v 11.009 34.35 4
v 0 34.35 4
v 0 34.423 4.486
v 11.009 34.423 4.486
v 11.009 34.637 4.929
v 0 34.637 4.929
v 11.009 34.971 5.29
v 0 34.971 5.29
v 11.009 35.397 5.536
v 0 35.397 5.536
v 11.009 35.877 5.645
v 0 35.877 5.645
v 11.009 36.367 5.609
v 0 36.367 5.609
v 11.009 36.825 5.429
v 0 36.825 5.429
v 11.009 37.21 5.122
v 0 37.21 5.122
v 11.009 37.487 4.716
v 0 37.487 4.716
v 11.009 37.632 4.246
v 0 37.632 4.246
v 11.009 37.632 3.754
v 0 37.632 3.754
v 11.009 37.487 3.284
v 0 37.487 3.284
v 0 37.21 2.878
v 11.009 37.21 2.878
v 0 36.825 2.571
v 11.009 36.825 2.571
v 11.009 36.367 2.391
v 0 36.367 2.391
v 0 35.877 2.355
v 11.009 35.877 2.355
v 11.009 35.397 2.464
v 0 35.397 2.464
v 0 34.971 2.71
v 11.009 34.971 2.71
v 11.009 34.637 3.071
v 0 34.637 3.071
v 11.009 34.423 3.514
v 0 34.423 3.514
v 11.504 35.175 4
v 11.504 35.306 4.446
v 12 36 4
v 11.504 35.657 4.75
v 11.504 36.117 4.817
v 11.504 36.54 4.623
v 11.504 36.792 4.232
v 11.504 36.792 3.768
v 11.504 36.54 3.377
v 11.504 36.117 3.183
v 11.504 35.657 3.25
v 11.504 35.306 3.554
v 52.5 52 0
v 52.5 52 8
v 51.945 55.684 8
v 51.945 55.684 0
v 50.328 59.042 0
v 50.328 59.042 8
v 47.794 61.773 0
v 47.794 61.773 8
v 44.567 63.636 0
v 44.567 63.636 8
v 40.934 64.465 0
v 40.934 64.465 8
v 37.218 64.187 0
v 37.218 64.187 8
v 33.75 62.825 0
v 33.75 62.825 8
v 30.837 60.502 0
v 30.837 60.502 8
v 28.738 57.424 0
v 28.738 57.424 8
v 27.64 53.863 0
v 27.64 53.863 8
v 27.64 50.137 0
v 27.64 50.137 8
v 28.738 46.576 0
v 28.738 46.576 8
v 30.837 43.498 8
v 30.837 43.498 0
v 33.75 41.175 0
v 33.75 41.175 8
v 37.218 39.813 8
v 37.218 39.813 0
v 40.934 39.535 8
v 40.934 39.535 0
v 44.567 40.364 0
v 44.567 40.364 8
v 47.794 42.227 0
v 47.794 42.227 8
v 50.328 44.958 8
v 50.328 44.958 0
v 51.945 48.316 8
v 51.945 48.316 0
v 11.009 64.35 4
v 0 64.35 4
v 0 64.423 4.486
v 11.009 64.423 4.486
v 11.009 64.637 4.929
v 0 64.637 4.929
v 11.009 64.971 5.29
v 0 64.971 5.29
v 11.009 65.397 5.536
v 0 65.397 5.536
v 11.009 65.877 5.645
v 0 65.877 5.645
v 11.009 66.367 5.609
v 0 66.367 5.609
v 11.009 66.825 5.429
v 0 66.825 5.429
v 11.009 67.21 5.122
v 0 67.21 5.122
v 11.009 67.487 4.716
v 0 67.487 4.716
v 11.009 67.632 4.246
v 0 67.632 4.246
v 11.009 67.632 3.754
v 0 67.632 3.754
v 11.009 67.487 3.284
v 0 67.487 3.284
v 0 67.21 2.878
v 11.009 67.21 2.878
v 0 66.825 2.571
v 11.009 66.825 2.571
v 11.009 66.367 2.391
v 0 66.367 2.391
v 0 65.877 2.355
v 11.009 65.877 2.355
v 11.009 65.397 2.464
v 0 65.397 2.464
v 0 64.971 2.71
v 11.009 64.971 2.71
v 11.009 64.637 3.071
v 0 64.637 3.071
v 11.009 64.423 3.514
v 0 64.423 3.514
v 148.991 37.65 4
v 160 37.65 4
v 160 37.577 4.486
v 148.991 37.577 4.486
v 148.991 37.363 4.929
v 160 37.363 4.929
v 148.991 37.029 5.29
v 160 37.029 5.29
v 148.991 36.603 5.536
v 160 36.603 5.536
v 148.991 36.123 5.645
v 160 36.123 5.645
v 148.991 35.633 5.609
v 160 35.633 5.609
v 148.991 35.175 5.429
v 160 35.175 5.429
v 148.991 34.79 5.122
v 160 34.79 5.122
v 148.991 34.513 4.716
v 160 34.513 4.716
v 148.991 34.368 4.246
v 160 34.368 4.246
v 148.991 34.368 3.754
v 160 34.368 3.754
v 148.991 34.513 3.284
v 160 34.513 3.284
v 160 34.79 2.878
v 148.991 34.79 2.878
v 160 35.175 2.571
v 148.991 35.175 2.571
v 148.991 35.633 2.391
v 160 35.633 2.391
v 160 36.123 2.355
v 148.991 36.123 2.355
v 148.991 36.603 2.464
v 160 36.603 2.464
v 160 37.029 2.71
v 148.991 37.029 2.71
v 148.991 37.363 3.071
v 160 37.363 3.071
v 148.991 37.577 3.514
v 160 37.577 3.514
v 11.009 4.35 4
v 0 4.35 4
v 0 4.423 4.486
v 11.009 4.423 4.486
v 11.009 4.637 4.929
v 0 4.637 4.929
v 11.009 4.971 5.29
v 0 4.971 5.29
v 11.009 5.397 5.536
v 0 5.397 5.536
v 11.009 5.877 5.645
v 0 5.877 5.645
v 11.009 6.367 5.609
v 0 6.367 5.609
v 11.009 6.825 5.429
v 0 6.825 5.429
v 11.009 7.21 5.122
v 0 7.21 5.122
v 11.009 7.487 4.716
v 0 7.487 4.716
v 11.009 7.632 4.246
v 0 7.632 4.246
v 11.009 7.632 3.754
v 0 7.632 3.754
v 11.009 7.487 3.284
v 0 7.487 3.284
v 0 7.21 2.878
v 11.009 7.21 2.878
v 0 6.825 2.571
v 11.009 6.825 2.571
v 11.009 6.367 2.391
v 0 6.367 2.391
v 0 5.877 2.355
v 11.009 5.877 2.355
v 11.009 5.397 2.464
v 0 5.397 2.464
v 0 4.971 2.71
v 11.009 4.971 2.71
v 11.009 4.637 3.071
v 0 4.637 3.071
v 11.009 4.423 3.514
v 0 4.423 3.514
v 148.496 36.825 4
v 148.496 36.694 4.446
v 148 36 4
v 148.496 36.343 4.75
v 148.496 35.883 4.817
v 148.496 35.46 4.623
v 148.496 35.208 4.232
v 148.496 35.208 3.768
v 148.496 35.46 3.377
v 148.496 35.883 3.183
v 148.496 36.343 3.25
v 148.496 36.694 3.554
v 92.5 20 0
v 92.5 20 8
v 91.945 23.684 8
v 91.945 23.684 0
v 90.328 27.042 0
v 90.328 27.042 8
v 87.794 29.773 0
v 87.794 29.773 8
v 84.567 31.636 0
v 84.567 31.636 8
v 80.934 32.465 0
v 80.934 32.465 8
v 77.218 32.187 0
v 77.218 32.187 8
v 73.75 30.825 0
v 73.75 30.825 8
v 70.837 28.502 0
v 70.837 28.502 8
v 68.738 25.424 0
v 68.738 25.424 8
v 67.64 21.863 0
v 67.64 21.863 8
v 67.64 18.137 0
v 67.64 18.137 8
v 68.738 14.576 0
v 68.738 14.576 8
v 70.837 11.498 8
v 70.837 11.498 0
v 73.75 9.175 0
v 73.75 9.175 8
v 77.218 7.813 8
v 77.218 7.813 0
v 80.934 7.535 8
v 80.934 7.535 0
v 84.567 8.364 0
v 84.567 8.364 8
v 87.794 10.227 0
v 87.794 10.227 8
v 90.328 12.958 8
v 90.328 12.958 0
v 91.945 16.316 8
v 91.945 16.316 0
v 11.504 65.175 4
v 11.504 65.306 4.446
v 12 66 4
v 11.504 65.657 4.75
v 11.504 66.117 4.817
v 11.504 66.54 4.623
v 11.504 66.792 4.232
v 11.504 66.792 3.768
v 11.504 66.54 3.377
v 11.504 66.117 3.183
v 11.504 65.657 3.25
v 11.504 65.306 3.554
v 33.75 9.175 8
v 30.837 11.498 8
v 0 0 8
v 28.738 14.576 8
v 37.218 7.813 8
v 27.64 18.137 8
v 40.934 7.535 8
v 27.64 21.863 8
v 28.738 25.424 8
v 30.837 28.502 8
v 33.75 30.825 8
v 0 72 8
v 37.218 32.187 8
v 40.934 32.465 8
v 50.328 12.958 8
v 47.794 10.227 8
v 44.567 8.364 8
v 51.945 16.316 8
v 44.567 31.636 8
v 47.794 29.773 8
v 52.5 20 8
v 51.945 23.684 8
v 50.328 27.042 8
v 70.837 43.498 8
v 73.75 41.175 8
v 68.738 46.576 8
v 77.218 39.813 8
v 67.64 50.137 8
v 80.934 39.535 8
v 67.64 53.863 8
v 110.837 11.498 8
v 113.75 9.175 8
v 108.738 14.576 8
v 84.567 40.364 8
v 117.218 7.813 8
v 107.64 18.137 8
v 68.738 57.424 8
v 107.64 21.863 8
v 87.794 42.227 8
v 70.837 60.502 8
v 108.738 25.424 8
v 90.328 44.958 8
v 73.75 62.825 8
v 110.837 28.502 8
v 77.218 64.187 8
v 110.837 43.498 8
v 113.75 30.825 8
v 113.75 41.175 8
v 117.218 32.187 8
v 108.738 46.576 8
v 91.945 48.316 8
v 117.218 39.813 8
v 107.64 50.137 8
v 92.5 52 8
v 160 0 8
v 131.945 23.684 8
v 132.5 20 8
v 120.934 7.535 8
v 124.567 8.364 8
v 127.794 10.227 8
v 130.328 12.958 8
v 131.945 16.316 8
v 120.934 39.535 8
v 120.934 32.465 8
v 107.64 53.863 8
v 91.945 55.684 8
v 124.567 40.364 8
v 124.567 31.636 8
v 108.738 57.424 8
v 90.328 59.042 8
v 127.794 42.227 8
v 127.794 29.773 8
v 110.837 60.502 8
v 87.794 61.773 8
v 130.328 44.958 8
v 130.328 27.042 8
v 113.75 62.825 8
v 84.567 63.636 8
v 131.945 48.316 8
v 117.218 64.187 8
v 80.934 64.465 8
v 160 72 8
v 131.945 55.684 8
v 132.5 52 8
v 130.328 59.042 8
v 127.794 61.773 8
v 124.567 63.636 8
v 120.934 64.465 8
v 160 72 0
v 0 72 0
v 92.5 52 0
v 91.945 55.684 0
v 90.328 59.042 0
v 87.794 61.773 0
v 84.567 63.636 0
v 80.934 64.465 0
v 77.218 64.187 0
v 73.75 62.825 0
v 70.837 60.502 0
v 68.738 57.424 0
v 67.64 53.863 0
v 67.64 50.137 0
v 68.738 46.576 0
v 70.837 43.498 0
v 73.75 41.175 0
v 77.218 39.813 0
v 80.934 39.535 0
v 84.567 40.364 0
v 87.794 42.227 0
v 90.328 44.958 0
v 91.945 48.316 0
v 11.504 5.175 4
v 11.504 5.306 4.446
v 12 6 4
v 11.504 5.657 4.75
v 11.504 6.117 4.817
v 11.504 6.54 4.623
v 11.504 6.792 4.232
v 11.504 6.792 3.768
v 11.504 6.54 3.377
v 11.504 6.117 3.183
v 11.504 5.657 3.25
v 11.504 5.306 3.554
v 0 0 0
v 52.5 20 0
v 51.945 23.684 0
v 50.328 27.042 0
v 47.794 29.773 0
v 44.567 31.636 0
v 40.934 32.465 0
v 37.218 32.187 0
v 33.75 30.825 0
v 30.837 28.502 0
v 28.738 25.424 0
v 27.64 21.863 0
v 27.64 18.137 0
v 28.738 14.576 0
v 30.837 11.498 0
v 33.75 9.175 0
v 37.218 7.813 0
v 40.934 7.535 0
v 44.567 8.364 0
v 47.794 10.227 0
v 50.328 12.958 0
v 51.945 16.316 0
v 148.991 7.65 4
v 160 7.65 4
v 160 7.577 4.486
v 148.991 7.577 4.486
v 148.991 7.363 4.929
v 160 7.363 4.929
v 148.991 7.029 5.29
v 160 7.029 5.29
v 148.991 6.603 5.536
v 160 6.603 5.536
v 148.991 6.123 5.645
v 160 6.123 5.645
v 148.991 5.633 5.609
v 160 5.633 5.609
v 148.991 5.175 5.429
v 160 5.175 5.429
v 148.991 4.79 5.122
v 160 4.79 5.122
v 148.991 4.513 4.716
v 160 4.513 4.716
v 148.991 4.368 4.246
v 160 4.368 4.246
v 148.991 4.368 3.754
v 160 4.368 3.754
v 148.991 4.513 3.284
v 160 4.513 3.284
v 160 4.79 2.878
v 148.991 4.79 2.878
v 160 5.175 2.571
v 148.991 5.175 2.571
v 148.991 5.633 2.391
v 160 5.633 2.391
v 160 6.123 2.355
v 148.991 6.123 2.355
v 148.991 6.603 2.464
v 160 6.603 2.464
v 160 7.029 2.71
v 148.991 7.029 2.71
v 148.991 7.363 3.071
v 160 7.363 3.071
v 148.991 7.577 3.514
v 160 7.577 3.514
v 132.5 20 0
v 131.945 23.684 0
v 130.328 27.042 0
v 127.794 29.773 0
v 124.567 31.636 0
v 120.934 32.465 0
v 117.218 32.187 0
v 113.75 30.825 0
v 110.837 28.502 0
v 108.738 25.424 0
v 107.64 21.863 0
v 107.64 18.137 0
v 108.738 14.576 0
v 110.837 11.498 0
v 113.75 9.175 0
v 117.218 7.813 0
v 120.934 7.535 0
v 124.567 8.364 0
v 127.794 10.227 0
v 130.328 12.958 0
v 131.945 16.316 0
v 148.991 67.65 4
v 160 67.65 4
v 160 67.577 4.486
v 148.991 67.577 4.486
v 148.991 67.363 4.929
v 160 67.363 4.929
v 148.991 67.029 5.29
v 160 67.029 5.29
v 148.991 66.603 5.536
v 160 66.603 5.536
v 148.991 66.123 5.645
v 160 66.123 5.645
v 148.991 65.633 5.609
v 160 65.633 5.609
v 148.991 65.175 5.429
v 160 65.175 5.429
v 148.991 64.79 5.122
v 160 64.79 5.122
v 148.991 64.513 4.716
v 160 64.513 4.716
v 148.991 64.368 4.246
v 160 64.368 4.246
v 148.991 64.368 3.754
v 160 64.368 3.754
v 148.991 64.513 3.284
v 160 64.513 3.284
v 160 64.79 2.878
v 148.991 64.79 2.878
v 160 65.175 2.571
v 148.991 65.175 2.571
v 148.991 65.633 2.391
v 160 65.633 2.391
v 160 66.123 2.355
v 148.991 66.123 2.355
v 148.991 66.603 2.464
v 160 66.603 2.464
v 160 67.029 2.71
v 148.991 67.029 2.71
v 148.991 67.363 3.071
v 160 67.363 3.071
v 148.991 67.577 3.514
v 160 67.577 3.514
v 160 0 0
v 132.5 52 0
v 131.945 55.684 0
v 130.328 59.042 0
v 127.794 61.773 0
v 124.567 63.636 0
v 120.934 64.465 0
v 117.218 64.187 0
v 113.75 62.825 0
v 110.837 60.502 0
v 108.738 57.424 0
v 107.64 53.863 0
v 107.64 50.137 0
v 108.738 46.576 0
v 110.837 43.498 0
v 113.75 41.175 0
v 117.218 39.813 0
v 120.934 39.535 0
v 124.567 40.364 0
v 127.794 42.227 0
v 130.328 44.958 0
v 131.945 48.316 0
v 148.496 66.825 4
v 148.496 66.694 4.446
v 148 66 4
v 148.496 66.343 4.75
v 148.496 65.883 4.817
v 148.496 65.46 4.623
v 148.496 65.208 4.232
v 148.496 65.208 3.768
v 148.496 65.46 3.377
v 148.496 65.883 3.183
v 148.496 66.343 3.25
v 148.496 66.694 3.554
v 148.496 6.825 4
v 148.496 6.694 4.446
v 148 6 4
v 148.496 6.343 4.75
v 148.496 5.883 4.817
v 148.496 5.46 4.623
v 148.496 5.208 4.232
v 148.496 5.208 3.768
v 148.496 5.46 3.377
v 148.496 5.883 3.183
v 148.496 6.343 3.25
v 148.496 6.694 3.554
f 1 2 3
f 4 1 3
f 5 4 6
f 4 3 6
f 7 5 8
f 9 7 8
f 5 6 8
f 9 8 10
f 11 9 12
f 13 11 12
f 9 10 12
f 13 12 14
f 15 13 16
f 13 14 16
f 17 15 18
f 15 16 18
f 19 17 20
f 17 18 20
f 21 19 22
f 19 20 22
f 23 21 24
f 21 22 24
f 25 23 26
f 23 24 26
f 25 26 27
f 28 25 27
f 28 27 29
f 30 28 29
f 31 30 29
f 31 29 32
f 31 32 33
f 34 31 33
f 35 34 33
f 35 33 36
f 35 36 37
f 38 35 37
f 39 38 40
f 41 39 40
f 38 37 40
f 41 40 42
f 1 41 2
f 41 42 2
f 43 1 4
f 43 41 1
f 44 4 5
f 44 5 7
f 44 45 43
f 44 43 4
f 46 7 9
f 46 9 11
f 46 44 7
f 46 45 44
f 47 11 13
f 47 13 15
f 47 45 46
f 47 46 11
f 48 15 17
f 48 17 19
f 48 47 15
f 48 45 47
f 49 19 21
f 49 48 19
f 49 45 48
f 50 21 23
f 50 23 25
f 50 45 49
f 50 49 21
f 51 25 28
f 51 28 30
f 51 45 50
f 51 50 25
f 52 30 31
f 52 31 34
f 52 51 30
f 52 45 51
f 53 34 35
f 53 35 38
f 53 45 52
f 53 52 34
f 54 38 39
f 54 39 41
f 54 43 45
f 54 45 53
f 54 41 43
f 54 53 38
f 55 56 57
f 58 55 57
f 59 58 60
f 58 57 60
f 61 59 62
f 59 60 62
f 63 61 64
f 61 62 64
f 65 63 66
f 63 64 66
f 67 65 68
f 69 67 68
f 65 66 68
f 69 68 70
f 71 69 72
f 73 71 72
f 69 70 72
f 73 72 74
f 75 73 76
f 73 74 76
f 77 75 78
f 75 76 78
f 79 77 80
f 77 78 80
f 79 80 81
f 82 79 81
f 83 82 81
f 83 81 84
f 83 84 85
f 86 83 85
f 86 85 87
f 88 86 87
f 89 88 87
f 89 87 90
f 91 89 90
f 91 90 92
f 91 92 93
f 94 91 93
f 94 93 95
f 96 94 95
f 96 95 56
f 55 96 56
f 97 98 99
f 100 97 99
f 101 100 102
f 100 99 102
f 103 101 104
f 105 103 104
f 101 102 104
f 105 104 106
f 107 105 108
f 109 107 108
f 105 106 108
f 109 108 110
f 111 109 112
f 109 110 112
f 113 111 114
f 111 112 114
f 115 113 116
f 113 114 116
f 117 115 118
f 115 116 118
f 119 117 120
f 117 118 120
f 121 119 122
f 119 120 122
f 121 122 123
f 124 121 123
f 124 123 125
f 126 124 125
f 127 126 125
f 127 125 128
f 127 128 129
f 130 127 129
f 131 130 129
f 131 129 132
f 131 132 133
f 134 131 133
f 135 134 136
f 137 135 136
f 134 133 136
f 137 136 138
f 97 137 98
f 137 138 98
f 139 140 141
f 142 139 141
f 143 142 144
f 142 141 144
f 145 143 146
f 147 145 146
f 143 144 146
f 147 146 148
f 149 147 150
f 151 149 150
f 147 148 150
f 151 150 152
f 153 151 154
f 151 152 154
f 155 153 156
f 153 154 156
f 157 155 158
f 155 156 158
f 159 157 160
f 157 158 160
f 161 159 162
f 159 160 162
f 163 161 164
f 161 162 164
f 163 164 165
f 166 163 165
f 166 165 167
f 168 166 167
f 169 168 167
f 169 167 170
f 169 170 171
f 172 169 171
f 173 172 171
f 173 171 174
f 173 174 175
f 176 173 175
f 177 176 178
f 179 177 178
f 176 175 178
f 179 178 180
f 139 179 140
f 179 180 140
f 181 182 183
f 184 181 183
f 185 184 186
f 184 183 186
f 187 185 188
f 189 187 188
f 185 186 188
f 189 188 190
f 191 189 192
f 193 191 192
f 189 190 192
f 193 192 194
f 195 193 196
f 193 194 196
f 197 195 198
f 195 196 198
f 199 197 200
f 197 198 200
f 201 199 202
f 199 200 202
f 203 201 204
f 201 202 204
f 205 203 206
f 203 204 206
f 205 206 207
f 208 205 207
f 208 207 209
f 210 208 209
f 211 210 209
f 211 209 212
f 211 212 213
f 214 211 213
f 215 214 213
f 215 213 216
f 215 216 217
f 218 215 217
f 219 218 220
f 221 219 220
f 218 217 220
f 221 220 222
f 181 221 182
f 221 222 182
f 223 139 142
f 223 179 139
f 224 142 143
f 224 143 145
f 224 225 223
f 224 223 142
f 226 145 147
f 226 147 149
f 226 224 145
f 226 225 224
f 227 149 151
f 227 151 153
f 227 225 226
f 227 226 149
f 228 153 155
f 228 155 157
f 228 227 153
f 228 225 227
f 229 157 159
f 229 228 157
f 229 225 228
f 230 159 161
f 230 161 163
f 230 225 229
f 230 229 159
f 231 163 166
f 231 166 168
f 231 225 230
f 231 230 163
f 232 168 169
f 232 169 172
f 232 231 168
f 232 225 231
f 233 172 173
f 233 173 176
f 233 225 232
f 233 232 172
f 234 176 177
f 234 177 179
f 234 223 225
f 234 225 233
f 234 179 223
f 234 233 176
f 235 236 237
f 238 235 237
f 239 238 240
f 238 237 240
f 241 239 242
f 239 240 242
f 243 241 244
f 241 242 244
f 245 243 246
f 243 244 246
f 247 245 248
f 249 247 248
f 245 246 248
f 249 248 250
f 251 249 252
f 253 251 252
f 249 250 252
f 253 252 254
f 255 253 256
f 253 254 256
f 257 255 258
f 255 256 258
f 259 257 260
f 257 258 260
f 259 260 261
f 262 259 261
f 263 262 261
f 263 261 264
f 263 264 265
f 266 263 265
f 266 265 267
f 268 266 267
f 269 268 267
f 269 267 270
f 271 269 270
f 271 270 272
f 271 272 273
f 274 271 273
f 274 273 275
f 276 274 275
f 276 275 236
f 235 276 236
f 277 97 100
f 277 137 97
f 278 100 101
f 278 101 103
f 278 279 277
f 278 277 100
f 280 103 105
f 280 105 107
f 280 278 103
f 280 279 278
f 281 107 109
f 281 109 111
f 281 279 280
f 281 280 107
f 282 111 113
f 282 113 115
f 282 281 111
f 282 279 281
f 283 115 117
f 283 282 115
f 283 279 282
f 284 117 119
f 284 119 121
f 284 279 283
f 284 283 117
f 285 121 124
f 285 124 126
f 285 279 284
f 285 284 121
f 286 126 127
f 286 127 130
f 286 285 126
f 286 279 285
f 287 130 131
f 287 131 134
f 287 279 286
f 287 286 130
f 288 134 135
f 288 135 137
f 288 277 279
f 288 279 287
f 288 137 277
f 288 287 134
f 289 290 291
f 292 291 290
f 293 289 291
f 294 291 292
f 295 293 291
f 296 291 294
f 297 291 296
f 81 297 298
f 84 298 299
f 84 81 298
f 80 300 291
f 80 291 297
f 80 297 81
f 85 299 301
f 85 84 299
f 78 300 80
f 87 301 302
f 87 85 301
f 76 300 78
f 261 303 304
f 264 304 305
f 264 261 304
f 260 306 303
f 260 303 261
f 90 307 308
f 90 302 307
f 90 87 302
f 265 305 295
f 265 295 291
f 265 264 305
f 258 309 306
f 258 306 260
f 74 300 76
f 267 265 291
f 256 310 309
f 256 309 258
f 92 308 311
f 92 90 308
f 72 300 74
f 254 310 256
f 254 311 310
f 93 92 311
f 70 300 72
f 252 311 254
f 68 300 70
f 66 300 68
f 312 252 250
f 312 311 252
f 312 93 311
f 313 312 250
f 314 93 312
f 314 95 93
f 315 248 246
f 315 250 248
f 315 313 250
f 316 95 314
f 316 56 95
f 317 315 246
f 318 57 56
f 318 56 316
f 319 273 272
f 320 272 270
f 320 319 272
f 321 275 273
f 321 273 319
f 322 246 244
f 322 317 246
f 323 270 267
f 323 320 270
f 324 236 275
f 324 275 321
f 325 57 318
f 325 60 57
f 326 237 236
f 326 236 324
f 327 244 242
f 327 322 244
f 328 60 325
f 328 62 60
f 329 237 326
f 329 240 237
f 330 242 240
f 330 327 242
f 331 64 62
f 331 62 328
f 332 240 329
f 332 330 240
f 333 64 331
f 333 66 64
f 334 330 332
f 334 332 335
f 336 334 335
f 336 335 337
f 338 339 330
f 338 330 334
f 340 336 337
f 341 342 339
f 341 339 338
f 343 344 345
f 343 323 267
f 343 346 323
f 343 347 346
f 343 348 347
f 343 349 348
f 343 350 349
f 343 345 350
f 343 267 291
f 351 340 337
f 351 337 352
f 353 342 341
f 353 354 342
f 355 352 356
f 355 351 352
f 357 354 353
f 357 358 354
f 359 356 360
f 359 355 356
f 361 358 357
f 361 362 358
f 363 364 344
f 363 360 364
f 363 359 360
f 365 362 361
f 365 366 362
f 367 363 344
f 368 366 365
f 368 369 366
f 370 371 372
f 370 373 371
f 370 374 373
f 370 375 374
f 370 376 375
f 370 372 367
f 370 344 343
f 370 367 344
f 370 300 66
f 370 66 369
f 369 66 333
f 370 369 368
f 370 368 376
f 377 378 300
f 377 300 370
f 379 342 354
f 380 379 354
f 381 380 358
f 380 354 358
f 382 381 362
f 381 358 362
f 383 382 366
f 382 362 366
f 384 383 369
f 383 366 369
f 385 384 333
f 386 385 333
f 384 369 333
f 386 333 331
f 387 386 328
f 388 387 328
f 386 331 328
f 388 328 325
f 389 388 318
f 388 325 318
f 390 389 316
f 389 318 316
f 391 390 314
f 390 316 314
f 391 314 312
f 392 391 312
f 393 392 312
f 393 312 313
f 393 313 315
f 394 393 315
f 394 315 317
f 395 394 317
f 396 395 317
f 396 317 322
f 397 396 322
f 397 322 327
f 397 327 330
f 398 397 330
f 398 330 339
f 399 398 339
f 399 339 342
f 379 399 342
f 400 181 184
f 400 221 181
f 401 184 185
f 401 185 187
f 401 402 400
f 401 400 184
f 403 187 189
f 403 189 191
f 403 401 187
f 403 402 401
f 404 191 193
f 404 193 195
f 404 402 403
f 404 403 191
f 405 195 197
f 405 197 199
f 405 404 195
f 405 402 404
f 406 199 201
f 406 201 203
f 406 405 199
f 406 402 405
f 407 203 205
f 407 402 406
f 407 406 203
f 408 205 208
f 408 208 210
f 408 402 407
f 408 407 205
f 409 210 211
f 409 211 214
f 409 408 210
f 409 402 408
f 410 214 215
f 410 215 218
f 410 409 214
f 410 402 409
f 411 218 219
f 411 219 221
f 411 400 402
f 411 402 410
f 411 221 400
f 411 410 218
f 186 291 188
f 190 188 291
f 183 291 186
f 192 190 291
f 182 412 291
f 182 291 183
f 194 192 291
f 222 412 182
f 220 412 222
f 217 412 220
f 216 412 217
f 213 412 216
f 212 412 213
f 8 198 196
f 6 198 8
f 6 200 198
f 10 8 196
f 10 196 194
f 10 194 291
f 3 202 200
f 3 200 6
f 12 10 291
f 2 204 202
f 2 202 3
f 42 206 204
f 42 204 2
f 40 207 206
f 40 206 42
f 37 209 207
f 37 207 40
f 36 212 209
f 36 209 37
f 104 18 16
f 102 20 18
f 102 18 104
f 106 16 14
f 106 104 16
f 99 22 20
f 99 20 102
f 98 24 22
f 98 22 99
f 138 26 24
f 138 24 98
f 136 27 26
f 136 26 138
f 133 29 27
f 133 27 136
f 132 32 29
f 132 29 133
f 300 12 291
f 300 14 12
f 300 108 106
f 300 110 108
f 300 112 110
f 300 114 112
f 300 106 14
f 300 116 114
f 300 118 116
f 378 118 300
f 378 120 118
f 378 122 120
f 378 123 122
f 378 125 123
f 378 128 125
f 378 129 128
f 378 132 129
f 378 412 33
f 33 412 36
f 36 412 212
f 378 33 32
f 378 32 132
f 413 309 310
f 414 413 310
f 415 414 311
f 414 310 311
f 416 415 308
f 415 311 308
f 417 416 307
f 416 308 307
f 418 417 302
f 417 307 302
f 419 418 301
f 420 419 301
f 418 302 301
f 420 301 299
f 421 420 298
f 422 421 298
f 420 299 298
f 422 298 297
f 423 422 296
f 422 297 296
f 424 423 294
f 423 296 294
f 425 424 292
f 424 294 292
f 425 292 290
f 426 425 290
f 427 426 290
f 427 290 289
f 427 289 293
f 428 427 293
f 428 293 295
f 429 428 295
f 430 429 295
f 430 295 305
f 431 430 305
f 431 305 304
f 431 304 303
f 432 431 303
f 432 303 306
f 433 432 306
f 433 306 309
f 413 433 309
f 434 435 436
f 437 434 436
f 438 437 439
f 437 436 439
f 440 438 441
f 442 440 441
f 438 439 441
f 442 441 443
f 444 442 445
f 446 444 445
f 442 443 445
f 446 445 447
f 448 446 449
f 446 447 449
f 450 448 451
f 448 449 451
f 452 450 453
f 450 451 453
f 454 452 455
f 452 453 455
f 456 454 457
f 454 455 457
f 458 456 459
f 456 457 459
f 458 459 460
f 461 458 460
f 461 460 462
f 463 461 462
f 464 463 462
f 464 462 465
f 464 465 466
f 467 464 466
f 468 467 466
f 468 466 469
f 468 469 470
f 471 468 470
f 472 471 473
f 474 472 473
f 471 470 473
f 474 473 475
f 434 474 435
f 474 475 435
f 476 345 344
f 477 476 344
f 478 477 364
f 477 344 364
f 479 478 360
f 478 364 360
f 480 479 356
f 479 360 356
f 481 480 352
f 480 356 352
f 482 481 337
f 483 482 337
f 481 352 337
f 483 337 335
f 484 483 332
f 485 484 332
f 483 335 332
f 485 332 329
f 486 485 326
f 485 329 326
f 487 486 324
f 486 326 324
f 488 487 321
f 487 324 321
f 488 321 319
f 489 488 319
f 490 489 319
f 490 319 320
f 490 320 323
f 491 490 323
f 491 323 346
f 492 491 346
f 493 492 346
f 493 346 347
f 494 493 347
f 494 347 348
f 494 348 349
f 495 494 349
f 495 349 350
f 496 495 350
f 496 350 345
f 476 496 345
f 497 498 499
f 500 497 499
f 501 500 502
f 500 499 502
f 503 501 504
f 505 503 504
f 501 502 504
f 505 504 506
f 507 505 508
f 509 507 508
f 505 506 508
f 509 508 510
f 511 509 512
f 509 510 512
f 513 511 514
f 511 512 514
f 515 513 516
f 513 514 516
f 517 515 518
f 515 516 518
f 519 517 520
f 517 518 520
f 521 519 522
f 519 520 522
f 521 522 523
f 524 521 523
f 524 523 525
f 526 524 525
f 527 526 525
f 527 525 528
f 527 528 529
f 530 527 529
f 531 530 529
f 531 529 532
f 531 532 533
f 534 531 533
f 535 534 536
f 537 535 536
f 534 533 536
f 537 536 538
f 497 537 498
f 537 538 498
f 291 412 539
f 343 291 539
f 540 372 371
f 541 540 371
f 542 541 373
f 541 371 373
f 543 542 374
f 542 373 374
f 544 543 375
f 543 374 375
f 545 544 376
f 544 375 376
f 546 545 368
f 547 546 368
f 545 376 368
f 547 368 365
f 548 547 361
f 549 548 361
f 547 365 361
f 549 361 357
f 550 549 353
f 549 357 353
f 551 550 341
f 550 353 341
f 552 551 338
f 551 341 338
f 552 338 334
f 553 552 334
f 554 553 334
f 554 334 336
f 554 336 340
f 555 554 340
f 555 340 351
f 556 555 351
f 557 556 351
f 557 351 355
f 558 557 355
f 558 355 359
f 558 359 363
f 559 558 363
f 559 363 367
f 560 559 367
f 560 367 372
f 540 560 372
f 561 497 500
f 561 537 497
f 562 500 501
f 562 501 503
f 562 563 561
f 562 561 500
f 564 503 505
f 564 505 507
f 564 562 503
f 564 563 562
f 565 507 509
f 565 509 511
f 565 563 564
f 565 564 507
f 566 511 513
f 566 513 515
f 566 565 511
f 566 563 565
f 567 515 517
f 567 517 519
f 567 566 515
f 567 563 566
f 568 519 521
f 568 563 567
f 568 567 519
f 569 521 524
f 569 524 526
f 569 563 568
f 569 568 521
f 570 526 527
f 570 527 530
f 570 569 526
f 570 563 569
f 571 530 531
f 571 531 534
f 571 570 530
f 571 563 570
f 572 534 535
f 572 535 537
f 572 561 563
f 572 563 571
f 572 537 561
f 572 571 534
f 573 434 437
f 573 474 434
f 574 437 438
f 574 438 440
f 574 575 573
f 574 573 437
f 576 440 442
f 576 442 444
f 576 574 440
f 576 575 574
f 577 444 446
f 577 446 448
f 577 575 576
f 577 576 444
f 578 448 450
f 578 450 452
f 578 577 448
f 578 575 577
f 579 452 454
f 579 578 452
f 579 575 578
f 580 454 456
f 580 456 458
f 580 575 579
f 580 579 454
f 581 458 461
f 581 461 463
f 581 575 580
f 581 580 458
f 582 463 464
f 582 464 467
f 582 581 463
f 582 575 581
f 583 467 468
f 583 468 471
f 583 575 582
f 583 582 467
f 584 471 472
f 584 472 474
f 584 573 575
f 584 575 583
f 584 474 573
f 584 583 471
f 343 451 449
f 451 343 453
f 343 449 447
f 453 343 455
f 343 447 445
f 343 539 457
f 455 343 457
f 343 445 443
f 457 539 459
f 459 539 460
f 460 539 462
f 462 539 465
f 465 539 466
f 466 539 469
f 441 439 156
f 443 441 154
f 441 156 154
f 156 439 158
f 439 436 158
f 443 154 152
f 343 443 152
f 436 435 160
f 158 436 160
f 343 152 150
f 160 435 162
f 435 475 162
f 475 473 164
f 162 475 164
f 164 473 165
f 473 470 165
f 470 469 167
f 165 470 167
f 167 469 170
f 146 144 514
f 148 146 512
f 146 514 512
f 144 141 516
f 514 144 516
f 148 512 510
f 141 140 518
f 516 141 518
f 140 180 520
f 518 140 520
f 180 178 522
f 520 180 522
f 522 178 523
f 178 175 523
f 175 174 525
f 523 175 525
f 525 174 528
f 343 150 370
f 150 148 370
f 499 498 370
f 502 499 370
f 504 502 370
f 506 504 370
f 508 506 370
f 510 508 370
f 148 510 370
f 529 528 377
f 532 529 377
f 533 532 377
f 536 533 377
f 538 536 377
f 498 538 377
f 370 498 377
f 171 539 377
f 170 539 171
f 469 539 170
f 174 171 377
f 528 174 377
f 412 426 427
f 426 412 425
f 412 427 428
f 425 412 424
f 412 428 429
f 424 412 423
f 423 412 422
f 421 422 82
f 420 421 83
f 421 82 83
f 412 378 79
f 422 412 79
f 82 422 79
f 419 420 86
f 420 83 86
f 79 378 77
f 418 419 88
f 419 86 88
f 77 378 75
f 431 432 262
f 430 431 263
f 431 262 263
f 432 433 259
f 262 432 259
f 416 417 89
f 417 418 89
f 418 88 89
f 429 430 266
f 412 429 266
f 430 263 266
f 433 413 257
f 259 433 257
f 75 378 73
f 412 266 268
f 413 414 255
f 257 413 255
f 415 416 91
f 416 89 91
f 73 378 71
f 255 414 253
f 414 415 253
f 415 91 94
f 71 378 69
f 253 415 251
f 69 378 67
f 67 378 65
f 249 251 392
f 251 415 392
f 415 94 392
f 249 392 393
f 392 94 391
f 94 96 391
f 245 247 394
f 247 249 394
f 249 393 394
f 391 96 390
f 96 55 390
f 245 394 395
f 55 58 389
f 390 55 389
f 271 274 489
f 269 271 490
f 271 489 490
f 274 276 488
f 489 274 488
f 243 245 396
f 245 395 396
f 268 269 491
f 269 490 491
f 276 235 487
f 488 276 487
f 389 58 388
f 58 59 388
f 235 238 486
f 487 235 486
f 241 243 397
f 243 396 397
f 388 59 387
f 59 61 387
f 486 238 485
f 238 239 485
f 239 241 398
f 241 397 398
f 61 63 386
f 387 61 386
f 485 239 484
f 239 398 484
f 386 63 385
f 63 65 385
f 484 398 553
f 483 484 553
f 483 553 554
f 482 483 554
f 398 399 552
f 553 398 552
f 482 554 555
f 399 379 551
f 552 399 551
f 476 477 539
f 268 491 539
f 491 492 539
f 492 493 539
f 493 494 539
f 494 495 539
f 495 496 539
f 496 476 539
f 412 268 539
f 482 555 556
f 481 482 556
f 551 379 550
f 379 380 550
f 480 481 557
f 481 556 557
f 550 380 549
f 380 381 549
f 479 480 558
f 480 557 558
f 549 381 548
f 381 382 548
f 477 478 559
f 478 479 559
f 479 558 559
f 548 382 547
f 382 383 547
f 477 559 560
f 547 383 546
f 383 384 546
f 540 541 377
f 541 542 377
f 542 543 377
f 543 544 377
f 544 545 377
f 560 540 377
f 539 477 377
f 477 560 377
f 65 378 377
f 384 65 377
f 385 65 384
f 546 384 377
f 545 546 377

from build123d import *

# Parameters (mm, degrees)
BOX_W          = 160
BOX_H          = 72
BOX_DEPTH      = 8
SKETCH_R       = 1.65
HOLE_DEPTH     = 11.00858
HOLE_TIPS_R    = 1.65
SKETCH001_R    = 1.65
HOLE001_DEPTH  = 11.00858
HOLE001_TIPS_R = 1.65
SKETCH002_R    = 12.5
HOLE002_DEPTH  = 8.001


with BuildPart() as part:
    # Box → Box (new body)
    with BuildSketch(Plane.XY):
        with Locations((80, 36)):
            Rectangle(BOX_W, BOX_H)
    extrude(amount=BOX_DEPTH)

    # Sketch (on Face1 of BaseFeature) → Hole (cut)
    with BuildSketch(Plane(origin=(0, 0, 0), x_dir=(0, -1, 0), z_dir=(-1, 0, 0))):
        with Locations((-66, 4)):
            Circle(SKETCH_R)
        with Locations((-36, 4)):
            Circle(SKETCH_R)
        with Locations((-6, 4)):
            Circle(SKETCH_R)
    extrude(amount=-HOLE_DEPTH, mode=Mode.SUBTRACT)

    # Hole tips → Hole tip 1 section 0
    with BuildSketch(Plane(origin=(11.00858, 0, 0), x_dir=(0, -1, 0), z_dir=(-1, 0, 0)), mode=Mode.PRIVATE) as hole_tip_1_s0:
        with Locations((-66, 4)):
            Circle(HOLE_TIPS_R)
    loft([hole_tip_1_s0.sketch, Vertex(12, 66, 4)], mode=Mode.SUBTRACT)

    # Hole tips → Hole tip 2 section 0
    with BuildSketch(Plane(origin=(11.00858, 0, 0), x_dir=(0, -1, 0), z_dir=(-1, 0, 0)), mode=Mode.PRIVATE) as hole_tip_2_s0:
        with Locations((-36, 4)):
            Circle(HOLE_TIPS_R)
    loft([hole_tip_2_s0.sketch, Vertex(12, 36, 4)], mode=Mode.SUBTRACT)

    # Hole tips → Hole tip 3 section 0
    with BuildSketch(Plane(origin=(11.00858, 0, 0), x_dir=(0, -1, 0), z_dir=(-1, 0, 0)), mode=Mode.PRIVATE) as hole_tip_3_s0:
        with Locations((-6, 4)):
            Circle(HOLE_TIPS_R)
    loft([hole_tip_3_s0.sketch, Vertex(12, 6, 4)], mode=Mode.SUBTRACT)

    # Sketch001 (on Face9 of Hole) → Hole001 (cut)
    with BuildSketch(Plane.YZ.offset(160)):
        with Locations((6, 4)):
            Circle(SKETCH001_R)
        with Locations((36, 4)):
            Circle(SKETCH001_R)
        with Locations((66, 4)):
            Circle(SKETCH001_R)
    extrude(amount=-HOLE001_DEPTH, mode=Mode.SUBTRACT)

    # Hole001 tips → Hole001 tip 1 section 0
    with BuildSketch(Plane.YZ.offset(148.99142), mode=Mode.PRIVATE) as hole001_tip_1_s0:
        with Locations((6, 4)):
            Circle(HOLE001_TIPS_R)
    loft([hole001_tip_1_s0.sketch, Vertex(148, 6, 4)], mode=Mode.SUBTRACT)

    # Hole001 tips → Hole001 tip 2 section 0
    with BuildSketch(Plane.YZ.offset(148.99142), mode=Mode.PRIVATE) as hole001_tip_2_s0:
        with Locations((36, 4)):
            Circle(HOLE001_TIPS_R)
    loft([hole001_tip_2_s0.sketch, Vertex(148, 36, 4)], mode=Mode.SUBTRACT)

    # Hole001 tips → Hole001 tip 3 section 0
    with BuildSketch(Plane.YZ.offset(148.99142), mode=Mode.PRIVATE) as hole001_tip_3_s0:
        with Locations((66, 4)):
            Circle(HOLE001_TIPS_R)
    loft([hole001_tip_3_s0.sketch, Vertex(148, 66, 4)], mode=Mode.SUBTRACT)

    # Sketch002 (on Face3 of Hole001) → Hole002 (cut, through all)
    with BuildSketch(Plane.XY.offset(8)):
        with Locations((40, 52)):
            Circle(SKETCH002_R)
        with Locations((40, 20)):
            Circle(SKETCH002_R)
        with Locations((120, 52)):
            Circle(SKETCH002_R)
        with Locations((120, 20)):
            Circle(SKETCH002_R)
        with Locations((80, 52)):
            Circle(SKETCH002_R)
        with Locations((80, 20)):
            Circle(SKETCH002_R)
    extrude(amount=-HOLE002_DEPTH, mode=Mode.SUBTRACT)


solid = part.part
